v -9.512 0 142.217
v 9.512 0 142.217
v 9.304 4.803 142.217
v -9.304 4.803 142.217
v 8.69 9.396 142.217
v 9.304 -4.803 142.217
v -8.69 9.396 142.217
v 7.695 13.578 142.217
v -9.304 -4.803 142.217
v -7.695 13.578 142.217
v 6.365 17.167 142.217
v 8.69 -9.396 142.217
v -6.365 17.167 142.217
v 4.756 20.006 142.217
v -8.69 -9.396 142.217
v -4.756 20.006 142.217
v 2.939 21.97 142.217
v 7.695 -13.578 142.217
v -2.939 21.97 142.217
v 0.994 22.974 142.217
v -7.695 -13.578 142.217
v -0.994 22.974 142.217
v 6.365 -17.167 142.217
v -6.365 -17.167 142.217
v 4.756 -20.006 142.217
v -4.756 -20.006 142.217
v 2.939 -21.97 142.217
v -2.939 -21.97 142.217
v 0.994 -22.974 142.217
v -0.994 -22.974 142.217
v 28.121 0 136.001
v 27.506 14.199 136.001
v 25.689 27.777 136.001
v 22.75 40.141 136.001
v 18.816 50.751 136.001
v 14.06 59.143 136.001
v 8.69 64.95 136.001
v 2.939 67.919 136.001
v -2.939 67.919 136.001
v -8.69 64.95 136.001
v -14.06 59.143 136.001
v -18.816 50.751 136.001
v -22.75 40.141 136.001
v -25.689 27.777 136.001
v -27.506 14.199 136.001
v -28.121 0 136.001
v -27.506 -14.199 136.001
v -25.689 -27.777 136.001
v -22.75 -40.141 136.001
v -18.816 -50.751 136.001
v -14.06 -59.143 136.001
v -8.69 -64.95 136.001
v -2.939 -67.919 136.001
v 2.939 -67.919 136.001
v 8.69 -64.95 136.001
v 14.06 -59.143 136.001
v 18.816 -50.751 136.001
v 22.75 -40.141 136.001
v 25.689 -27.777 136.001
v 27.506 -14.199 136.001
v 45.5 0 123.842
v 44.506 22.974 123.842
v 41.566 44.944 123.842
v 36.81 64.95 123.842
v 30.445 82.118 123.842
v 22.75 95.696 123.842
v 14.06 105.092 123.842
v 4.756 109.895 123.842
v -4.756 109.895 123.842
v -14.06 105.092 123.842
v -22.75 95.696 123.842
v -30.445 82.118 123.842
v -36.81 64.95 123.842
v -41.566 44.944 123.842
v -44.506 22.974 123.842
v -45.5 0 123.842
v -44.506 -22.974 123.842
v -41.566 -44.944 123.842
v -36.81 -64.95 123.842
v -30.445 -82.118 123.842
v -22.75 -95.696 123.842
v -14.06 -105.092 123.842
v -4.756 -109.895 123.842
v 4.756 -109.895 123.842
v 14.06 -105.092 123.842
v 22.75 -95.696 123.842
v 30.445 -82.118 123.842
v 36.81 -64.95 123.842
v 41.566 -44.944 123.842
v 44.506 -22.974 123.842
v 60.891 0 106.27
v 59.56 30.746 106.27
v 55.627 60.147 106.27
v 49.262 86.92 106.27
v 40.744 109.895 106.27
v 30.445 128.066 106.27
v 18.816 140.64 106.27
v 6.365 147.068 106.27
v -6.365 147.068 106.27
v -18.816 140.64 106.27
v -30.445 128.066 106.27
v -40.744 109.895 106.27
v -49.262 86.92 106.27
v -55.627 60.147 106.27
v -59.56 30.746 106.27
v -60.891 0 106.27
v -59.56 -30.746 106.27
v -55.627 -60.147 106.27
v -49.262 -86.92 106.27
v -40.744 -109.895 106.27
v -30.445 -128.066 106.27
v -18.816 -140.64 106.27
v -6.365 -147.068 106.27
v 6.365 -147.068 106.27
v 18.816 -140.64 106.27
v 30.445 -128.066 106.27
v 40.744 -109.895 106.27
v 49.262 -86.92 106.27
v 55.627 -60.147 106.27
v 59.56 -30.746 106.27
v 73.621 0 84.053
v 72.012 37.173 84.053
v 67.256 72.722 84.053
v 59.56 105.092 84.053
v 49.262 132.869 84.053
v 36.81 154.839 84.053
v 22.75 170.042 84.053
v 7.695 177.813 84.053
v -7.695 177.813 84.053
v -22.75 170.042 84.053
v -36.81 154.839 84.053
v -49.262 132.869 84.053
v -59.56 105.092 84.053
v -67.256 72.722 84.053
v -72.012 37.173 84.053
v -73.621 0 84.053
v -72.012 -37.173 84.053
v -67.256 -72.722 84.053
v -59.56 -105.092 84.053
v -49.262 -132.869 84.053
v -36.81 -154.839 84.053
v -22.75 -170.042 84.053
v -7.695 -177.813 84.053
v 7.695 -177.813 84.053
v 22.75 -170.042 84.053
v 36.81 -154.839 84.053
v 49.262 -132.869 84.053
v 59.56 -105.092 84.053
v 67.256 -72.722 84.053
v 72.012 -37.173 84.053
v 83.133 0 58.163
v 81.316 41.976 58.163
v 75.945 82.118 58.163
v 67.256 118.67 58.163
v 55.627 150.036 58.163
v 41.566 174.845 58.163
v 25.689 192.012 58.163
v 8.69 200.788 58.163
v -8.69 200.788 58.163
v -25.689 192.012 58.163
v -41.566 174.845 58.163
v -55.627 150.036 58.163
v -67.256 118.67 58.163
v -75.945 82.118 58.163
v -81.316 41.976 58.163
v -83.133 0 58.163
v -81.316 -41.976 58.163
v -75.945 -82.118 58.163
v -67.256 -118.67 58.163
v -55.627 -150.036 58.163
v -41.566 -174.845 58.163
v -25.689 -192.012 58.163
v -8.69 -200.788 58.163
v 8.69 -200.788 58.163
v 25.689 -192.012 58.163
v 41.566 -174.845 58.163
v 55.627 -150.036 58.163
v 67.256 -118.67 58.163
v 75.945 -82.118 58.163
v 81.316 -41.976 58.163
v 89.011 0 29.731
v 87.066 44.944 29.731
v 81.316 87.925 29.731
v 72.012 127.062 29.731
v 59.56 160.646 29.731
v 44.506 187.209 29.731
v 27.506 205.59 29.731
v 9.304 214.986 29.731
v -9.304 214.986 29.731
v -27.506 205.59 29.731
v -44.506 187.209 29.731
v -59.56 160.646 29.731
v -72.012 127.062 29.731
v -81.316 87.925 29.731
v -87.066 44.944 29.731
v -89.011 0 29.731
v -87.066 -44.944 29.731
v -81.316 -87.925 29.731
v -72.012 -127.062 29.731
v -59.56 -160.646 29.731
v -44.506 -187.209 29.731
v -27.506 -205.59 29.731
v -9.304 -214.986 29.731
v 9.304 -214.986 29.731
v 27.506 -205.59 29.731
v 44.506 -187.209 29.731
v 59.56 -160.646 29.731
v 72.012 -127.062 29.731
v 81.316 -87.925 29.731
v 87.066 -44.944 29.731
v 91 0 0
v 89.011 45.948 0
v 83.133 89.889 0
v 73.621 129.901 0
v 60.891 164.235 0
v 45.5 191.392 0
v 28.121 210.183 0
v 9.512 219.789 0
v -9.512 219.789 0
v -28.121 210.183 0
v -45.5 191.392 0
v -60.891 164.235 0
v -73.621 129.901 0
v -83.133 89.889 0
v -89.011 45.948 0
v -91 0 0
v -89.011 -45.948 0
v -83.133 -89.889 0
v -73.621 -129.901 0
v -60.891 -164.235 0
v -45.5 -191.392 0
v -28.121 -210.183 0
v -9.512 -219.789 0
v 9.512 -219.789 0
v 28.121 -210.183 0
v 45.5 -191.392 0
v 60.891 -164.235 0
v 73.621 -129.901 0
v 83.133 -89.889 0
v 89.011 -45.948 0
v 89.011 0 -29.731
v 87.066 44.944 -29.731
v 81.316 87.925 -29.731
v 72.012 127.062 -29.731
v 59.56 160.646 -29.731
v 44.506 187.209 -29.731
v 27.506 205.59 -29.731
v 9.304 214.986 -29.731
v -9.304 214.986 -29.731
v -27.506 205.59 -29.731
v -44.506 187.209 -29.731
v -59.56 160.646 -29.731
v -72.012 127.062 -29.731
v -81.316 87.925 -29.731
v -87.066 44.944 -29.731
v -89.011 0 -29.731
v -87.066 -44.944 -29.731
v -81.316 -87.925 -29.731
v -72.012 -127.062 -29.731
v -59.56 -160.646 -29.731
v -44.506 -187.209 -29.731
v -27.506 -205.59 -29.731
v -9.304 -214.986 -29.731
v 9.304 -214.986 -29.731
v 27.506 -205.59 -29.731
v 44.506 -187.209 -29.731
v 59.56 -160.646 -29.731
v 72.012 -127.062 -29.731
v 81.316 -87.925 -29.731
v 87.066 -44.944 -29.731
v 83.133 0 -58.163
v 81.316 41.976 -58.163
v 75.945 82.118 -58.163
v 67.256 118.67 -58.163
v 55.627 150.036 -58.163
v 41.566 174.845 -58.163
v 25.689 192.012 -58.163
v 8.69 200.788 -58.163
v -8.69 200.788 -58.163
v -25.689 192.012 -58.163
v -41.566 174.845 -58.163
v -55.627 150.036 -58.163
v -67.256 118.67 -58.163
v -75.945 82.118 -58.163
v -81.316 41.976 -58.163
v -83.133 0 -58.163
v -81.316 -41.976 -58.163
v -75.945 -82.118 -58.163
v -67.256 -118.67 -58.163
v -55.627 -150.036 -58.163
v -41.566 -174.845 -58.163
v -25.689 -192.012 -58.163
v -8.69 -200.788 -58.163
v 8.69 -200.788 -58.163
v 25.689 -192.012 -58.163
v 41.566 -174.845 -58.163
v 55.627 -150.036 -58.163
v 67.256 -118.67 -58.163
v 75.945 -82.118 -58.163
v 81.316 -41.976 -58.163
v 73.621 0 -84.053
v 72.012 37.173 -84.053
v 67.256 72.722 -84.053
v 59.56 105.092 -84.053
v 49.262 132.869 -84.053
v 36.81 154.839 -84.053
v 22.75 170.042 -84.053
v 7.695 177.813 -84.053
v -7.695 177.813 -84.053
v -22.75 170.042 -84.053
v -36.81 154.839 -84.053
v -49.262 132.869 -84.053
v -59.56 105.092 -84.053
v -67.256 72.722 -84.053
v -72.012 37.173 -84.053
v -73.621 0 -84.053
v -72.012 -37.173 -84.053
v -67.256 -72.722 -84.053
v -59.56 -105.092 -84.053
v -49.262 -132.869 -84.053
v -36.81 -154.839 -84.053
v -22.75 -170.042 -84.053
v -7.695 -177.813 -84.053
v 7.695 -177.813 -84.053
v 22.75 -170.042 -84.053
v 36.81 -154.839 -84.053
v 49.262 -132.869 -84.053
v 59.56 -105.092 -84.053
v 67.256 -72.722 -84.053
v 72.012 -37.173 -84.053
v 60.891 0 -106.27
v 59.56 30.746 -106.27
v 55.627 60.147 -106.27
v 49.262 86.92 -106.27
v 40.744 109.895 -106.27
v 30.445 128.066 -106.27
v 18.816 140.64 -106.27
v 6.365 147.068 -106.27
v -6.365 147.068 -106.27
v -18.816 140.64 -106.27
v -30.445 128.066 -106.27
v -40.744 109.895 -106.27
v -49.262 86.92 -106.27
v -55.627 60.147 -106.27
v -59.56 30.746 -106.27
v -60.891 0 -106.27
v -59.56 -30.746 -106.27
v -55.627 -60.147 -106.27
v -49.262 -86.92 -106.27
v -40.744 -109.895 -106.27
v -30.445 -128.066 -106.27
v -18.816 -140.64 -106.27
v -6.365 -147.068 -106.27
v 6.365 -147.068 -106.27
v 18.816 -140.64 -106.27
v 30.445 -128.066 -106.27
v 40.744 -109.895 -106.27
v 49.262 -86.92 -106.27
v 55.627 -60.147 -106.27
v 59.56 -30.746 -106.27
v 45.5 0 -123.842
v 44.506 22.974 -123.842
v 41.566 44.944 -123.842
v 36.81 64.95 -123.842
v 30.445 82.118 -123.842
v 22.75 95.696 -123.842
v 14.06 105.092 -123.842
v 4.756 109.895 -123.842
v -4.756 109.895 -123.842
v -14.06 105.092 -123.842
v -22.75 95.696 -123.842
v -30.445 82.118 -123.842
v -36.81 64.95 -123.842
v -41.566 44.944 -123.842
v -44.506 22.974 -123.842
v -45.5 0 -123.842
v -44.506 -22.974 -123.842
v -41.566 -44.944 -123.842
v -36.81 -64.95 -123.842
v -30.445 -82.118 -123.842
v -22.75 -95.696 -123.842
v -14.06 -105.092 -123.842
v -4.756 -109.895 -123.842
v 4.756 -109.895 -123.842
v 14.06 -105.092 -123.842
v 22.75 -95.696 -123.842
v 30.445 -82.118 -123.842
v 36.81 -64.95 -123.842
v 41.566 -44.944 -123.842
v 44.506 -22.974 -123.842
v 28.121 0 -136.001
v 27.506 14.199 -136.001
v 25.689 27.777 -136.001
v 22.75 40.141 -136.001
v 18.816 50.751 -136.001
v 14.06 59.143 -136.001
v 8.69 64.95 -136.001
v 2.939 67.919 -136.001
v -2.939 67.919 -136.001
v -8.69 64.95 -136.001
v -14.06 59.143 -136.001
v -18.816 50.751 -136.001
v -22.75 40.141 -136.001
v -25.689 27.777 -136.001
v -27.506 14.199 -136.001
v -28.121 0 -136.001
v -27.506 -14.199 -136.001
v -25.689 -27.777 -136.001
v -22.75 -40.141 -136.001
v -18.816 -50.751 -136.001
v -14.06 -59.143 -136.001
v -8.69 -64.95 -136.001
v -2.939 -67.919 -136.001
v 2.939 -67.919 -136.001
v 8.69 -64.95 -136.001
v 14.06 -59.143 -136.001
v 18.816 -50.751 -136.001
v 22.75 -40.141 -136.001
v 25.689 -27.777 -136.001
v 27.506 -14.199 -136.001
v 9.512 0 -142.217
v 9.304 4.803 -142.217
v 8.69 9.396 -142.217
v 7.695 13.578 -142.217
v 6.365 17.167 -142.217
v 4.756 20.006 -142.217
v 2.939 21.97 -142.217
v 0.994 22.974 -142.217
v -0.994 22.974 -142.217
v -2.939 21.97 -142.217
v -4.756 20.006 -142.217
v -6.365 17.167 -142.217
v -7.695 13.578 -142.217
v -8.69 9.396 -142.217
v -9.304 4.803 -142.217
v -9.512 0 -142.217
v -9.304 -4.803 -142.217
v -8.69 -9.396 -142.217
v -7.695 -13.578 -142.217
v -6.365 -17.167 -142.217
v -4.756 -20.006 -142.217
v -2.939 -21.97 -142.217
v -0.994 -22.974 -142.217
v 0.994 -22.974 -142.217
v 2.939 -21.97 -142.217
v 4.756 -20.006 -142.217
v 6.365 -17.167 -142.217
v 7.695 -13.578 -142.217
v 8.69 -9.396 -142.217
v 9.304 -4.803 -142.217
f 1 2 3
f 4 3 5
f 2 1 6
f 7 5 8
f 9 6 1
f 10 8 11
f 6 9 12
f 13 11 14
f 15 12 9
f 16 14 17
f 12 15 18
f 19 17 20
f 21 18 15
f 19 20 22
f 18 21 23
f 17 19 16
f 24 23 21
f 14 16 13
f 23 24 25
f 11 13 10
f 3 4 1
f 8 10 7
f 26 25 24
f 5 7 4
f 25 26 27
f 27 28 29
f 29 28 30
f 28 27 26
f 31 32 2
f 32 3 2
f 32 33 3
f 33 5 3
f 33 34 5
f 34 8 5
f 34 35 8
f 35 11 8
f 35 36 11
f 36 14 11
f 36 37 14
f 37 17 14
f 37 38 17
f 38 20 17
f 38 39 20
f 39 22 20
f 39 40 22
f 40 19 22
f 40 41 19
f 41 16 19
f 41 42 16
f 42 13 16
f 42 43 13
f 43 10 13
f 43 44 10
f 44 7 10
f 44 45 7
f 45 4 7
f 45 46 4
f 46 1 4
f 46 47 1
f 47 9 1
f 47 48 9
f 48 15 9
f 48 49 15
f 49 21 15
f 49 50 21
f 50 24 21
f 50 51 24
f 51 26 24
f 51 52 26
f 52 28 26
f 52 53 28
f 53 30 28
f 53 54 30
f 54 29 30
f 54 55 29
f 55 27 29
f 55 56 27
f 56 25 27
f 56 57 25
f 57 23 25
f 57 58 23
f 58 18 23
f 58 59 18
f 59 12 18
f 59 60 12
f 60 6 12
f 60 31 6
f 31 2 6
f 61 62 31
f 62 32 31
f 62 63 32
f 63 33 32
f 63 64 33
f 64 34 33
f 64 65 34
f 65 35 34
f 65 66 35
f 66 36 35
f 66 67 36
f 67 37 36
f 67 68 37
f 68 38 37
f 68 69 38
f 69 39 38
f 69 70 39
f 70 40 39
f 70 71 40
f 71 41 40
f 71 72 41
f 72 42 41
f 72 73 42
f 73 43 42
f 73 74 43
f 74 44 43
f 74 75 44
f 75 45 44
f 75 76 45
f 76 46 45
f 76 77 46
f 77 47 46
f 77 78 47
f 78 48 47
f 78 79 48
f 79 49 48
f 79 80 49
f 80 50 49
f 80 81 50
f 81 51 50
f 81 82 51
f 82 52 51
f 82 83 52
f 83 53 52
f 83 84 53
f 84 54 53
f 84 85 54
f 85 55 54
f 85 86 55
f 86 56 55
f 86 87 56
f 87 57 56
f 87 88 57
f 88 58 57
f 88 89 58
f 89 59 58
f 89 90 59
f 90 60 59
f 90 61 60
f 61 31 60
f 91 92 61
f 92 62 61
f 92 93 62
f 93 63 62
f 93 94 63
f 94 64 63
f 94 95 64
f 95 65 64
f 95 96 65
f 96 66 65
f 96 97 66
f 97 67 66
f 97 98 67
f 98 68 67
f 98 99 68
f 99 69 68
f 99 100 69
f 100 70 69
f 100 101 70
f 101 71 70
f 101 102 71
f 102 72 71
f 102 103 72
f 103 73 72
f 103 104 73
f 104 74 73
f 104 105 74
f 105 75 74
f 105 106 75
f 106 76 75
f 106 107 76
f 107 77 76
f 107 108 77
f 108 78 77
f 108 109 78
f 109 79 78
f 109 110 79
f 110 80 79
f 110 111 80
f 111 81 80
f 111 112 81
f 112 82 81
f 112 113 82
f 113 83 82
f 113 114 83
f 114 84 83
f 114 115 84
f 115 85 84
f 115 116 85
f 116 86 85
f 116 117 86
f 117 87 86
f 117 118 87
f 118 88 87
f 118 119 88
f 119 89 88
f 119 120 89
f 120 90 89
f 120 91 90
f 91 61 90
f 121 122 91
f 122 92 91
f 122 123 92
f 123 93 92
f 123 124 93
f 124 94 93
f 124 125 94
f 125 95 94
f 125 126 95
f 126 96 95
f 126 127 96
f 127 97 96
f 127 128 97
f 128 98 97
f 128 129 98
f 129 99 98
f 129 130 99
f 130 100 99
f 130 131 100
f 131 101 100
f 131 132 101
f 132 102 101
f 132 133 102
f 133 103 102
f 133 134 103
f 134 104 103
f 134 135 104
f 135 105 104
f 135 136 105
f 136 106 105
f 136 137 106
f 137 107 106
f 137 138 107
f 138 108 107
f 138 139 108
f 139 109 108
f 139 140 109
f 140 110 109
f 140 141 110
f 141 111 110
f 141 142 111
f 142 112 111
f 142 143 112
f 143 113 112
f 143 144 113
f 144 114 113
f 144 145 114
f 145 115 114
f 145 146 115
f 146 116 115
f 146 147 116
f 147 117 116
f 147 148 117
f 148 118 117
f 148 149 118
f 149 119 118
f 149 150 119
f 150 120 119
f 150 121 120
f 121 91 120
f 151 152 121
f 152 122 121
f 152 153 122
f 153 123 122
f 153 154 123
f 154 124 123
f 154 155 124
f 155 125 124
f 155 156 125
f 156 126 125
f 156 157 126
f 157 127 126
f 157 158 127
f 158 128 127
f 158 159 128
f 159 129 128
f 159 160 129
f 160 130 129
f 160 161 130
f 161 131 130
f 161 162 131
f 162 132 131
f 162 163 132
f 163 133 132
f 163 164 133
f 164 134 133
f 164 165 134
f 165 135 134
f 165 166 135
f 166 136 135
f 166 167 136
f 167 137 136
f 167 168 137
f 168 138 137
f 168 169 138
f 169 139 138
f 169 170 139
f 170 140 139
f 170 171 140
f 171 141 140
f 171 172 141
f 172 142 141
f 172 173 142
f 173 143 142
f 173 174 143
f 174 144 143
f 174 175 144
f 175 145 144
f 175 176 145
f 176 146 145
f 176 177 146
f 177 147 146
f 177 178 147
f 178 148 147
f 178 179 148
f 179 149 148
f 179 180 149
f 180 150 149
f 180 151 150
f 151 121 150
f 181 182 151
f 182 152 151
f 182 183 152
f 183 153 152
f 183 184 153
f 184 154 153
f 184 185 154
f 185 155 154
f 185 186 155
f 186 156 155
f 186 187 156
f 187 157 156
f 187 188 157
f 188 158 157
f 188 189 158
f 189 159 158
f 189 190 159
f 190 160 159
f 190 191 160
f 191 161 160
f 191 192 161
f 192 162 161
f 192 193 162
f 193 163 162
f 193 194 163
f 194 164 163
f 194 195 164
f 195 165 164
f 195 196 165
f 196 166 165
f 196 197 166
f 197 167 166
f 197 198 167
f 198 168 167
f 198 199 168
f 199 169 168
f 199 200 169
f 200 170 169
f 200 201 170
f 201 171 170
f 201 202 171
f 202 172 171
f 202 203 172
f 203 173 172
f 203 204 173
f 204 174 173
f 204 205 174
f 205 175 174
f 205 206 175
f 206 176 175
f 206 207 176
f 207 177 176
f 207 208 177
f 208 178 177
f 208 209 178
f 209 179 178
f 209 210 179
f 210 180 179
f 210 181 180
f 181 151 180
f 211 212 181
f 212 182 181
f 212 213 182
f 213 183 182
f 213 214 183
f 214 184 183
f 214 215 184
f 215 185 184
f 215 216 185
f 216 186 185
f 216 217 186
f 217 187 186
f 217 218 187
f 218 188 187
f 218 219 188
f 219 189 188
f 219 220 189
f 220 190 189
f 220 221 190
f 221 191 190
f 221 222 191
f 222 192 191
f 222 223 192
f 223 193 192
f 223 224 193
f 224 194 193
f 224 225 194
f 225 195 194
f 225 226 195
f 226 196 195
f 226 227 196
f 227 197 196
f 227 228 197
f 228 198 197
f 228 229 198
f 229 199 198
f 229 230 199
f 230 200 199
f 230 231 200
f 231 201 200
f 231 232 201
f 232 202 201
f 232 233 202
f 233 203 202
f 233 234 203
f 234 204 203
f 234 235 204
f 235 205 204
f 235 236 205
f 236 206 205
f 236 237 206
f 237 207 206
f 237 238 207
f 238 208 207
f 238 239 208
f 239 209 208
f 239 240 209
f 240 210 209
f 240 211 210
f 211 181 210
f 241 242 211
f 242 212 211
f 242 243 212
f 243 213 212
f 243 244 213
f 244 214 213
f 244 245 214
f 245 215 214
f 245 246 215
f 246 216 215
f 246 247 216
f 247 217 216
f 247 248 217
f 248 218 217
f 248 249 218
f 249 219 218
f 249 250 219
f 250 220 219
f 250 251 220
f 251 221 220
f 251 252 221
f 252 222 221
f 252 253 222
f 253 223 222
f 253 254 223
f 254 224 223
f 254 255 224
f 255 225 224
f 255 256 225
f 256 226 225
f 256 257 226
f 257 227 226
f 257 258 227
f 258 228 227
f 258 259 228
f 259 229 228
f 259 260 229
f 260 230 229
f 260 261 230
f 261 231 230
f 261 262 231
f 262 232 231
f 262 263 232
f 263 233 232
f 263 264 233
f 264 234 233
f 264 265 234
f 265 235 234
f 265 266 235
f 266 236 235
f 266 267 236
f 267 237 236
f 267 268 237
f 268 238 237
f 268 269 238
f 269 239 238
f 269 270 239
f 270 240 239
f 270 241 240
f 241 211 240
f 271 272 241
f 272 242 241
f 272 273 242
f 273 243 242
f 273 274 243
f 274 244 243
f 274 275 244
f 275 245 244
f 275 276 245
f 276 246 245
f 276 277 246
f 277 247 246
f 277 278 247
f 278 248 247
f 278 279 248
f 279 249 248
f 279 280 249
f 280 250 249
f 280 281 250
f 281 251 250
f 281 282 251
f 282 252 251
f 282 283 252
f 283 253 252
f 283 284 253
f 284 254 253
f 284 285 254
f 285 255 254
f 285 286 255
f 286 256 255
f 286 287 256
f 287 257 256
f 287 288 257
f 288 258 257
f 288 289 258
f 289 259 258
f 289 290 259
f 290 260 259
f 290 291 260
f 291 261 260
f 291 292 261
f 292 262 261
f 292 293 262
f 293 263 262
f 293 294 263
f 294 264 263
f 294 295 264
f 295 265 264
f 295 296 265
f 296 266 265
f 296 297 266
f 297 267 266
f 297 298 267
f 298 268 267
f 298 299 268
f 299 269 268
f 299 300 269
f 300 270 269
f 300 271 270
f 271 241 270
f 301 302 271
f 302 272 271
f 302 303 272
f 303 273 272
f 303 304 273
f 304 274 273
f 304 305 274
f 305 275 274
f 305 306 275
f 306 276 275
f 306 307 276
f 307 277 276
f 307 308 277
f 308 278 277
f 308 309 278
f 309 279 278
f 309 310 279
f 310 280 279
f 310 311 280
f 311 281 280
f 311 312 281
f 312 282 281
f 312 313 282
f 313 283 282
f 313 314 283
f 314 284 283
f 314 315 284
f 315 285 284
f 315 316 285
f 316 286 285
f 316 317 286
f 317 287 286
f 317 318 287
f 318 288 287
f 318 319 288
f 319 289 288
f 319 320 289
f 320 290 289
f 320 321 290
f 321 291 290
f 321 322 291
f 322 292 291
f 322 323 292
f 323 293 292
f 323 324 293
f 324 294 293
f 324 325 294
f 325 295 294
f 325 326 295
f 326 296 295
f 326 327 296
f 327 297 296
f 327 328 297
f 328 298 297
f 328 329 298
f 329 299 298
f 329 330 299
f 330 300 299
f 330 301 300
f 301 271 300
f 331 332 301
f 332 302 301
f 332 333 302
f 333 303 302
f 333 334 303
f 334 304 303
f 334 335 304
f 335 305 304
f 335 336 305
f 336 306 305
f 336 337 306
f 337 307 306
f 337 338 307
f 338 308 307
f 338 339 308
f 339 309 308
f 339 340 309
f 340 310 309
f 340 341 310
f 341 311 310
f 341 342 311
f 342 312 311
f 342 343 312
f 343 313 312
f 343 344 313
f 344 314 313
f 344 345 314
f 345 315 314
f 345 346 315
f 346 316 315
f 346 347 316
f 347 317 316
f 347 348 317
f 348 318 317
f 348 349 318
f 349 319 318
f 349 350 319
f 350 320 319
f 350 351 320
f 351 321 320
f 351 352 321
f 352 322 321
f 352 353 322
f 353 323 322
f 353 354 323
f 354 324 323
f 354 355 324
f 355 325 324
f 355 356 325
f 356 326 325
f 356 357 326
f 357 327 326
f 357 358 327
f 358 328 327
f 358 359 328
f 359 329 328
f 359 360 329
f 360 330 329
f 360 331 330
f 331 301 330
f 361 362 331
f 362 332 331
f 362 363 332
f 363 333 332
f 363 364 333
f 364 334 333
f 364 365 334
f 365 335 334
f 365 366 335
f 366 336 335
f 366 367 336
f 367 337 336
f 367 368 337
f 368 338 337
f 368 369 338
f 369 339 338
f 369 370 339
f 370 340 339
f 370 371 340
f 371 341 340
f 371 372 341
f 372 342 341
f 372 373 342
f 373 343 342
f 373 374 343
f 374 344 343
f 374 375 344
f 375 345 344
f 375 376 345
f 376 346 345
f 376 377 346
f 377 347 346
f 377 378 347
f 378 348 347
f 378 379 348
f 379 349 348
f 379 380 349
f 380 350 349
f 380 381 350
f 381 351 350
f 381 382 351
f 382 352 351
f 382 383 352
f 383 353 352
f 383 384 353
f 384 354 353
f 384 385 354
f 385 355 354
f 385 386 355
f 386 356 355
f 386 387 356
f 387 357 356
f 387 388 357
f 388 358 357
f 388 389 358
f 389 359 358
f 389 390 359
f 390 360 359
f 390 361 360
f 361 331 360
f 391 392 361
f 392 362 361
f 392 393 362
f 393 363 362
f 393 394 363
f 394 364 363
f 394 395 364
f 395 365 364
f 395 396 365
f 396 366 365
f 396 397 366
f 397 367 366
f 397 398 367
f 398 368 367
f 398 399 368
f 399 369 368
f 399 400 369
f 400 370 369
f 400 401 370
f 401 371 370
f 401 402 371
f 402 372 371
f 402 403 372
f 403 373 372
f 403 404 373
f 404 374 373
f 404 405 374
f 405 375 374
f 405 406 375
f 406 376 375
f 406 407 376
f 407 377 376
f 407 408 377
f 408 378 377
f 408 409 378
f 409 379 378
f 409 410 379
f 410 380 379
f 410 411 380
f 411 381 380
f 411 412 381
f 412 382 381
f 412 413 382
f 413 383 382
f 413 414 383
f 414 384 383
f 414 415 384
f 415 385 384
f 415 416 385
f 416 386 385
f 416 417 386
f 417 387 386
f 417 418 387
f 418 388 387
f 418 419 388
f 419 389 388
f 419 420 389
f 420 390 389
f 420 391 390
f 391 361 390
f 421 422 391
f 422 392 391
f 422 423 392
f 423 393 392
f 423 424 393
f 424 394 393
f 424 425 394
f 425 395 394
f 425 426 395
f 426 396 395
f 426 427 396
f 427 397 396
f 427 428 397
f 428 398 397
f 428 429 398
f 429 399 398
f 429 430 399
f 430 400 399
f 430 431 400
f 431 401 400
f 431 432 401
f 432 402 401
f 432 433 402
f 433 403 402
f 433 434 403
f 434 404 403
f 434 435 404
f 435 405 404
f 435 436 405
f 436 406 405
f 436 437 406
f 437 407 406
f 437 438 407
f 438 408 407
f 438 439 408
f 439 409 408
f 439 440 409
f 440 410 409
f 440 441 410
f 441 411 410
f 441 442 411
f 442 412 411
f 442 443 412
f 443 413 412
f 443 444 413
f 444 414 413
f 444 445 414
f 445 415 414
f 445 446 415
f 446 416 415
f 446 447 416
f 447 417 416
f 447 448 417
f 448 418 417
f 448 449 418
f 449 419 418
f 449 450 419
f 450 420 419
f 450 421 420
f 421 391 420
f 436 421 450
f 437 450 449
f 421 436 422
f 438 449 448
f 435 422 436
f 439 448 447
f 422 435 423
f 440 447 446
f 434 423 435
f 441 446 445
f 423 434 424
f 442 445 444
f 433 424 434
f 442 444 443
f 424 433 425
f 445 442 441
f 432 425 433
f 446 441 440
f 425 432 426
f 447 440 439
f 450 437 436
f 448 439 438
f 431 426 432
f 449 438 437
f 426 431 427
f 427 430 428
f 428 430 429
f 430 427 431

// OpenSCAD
// Generated by SolidPython 1.0.1 on 2020-07-29 00:46:48


scale(v = [7, 17, 11]) {
	sphere(r = 13);
}
/***********************************************
*********      SolidPython code:      **********
************************************************
 
# import packages: SolidPython
from solid import *
from solid.utils import *
from itertools import chain, combinations, permutations


class Resize:

    def __init__(self, scad_file):
        self.scad_file = scad_file
        #self.scad_file = import_scad(scad_file)
        # cone/cylinder param:
        self.r1 = 0
        self.r2 = 0
        self.h = 0
        # rectangular prism param:
        self.w = 0
        self.l = 0
        # ellipse param:
        self.r = 0

    # import OpenScad code (file name corresponds to shape)


    # classify shape + parameters
    def assign(self, param1, param2, param3):
        if self.scad_file == 'cone.scad':
            self.r1 = param1
            self.r2 = param2
            self.h = param3
        elif self.scad_file == 'cylinder.scad':
            self.r1 = param1
            self.r2 = param2
            self.h = param3
        elif self.scad_file == 'rectangularPrism.scad':
            self.h = param1
            self.l = param2
            self.w = param3
        else:
            self.r = param1
            self.h = param2

    # resize parameters
    def iterate(self):
        x = range(3, 20, 2)
        i = 1
        if self.scad_file == 'cone.scad':
            tempList = list(permutations(x, 2))
            for temp in tempList:
                param1 = temp[0]
                param2 = temp[1]
                filepath = 'produced_scad_files/' + 'cone' + str(param1) + '_' + str(param2) + '_' + '.scad'
                scad_render_to_file(cylinder(h=param1, r1=param2, r2=0), filepath)

        elif self.scad_file == 'cylinder.scad':
            tempList = list(permutations(x, 3))
            for temp in tempList:
                param1 = temp[0]
                param2 = temp[1]
                filepath = 'produced_scad_files/' + 'cylinder' + str(param1) + '_' + str(param2) + '_' + '.scad'
                scad_render_to_file(cylinder(h=param1, r1=param2, r2=param2), filepath)

        elif self.scad_file == 'rectangularPrism.scad':
            tempList = list(permutations(x, 3))
            for temp in tempList:
                param1 = temp[0]
                param2 = temp[1]
                param3 = temp[2]
                filepath = 'produced_scad_files/' + 'rectangularPrism' + str(param1) + '_' + str(param2) + '_' + str(
                    param3) + '.scad'
                scad_render_to_file(cube(size=(param1, param2, param3)), filepath)

        elif self.scad_file == 'ellipse.scad':
            tempList = list(permutations(x, 4))
            for temp in tempList:
                param1 = temp[0]
                param2 = temp[1]
                param3 = temp[2]
                param4 = temp[3]
                filepath = 'produced_scad_files/' + 'ellipse' + str(param1) + '_' + str(param2) + '_' + str(param3) + '_' + str(param4) + '.scad'
                scad_render_to_file(scale([param1, param2, param3])(sphere(r=param4)), filepath)

    def render_to_scadfile(self):
        scad_render_to_file(scad, 'example.scad') 
 
************************************************/
